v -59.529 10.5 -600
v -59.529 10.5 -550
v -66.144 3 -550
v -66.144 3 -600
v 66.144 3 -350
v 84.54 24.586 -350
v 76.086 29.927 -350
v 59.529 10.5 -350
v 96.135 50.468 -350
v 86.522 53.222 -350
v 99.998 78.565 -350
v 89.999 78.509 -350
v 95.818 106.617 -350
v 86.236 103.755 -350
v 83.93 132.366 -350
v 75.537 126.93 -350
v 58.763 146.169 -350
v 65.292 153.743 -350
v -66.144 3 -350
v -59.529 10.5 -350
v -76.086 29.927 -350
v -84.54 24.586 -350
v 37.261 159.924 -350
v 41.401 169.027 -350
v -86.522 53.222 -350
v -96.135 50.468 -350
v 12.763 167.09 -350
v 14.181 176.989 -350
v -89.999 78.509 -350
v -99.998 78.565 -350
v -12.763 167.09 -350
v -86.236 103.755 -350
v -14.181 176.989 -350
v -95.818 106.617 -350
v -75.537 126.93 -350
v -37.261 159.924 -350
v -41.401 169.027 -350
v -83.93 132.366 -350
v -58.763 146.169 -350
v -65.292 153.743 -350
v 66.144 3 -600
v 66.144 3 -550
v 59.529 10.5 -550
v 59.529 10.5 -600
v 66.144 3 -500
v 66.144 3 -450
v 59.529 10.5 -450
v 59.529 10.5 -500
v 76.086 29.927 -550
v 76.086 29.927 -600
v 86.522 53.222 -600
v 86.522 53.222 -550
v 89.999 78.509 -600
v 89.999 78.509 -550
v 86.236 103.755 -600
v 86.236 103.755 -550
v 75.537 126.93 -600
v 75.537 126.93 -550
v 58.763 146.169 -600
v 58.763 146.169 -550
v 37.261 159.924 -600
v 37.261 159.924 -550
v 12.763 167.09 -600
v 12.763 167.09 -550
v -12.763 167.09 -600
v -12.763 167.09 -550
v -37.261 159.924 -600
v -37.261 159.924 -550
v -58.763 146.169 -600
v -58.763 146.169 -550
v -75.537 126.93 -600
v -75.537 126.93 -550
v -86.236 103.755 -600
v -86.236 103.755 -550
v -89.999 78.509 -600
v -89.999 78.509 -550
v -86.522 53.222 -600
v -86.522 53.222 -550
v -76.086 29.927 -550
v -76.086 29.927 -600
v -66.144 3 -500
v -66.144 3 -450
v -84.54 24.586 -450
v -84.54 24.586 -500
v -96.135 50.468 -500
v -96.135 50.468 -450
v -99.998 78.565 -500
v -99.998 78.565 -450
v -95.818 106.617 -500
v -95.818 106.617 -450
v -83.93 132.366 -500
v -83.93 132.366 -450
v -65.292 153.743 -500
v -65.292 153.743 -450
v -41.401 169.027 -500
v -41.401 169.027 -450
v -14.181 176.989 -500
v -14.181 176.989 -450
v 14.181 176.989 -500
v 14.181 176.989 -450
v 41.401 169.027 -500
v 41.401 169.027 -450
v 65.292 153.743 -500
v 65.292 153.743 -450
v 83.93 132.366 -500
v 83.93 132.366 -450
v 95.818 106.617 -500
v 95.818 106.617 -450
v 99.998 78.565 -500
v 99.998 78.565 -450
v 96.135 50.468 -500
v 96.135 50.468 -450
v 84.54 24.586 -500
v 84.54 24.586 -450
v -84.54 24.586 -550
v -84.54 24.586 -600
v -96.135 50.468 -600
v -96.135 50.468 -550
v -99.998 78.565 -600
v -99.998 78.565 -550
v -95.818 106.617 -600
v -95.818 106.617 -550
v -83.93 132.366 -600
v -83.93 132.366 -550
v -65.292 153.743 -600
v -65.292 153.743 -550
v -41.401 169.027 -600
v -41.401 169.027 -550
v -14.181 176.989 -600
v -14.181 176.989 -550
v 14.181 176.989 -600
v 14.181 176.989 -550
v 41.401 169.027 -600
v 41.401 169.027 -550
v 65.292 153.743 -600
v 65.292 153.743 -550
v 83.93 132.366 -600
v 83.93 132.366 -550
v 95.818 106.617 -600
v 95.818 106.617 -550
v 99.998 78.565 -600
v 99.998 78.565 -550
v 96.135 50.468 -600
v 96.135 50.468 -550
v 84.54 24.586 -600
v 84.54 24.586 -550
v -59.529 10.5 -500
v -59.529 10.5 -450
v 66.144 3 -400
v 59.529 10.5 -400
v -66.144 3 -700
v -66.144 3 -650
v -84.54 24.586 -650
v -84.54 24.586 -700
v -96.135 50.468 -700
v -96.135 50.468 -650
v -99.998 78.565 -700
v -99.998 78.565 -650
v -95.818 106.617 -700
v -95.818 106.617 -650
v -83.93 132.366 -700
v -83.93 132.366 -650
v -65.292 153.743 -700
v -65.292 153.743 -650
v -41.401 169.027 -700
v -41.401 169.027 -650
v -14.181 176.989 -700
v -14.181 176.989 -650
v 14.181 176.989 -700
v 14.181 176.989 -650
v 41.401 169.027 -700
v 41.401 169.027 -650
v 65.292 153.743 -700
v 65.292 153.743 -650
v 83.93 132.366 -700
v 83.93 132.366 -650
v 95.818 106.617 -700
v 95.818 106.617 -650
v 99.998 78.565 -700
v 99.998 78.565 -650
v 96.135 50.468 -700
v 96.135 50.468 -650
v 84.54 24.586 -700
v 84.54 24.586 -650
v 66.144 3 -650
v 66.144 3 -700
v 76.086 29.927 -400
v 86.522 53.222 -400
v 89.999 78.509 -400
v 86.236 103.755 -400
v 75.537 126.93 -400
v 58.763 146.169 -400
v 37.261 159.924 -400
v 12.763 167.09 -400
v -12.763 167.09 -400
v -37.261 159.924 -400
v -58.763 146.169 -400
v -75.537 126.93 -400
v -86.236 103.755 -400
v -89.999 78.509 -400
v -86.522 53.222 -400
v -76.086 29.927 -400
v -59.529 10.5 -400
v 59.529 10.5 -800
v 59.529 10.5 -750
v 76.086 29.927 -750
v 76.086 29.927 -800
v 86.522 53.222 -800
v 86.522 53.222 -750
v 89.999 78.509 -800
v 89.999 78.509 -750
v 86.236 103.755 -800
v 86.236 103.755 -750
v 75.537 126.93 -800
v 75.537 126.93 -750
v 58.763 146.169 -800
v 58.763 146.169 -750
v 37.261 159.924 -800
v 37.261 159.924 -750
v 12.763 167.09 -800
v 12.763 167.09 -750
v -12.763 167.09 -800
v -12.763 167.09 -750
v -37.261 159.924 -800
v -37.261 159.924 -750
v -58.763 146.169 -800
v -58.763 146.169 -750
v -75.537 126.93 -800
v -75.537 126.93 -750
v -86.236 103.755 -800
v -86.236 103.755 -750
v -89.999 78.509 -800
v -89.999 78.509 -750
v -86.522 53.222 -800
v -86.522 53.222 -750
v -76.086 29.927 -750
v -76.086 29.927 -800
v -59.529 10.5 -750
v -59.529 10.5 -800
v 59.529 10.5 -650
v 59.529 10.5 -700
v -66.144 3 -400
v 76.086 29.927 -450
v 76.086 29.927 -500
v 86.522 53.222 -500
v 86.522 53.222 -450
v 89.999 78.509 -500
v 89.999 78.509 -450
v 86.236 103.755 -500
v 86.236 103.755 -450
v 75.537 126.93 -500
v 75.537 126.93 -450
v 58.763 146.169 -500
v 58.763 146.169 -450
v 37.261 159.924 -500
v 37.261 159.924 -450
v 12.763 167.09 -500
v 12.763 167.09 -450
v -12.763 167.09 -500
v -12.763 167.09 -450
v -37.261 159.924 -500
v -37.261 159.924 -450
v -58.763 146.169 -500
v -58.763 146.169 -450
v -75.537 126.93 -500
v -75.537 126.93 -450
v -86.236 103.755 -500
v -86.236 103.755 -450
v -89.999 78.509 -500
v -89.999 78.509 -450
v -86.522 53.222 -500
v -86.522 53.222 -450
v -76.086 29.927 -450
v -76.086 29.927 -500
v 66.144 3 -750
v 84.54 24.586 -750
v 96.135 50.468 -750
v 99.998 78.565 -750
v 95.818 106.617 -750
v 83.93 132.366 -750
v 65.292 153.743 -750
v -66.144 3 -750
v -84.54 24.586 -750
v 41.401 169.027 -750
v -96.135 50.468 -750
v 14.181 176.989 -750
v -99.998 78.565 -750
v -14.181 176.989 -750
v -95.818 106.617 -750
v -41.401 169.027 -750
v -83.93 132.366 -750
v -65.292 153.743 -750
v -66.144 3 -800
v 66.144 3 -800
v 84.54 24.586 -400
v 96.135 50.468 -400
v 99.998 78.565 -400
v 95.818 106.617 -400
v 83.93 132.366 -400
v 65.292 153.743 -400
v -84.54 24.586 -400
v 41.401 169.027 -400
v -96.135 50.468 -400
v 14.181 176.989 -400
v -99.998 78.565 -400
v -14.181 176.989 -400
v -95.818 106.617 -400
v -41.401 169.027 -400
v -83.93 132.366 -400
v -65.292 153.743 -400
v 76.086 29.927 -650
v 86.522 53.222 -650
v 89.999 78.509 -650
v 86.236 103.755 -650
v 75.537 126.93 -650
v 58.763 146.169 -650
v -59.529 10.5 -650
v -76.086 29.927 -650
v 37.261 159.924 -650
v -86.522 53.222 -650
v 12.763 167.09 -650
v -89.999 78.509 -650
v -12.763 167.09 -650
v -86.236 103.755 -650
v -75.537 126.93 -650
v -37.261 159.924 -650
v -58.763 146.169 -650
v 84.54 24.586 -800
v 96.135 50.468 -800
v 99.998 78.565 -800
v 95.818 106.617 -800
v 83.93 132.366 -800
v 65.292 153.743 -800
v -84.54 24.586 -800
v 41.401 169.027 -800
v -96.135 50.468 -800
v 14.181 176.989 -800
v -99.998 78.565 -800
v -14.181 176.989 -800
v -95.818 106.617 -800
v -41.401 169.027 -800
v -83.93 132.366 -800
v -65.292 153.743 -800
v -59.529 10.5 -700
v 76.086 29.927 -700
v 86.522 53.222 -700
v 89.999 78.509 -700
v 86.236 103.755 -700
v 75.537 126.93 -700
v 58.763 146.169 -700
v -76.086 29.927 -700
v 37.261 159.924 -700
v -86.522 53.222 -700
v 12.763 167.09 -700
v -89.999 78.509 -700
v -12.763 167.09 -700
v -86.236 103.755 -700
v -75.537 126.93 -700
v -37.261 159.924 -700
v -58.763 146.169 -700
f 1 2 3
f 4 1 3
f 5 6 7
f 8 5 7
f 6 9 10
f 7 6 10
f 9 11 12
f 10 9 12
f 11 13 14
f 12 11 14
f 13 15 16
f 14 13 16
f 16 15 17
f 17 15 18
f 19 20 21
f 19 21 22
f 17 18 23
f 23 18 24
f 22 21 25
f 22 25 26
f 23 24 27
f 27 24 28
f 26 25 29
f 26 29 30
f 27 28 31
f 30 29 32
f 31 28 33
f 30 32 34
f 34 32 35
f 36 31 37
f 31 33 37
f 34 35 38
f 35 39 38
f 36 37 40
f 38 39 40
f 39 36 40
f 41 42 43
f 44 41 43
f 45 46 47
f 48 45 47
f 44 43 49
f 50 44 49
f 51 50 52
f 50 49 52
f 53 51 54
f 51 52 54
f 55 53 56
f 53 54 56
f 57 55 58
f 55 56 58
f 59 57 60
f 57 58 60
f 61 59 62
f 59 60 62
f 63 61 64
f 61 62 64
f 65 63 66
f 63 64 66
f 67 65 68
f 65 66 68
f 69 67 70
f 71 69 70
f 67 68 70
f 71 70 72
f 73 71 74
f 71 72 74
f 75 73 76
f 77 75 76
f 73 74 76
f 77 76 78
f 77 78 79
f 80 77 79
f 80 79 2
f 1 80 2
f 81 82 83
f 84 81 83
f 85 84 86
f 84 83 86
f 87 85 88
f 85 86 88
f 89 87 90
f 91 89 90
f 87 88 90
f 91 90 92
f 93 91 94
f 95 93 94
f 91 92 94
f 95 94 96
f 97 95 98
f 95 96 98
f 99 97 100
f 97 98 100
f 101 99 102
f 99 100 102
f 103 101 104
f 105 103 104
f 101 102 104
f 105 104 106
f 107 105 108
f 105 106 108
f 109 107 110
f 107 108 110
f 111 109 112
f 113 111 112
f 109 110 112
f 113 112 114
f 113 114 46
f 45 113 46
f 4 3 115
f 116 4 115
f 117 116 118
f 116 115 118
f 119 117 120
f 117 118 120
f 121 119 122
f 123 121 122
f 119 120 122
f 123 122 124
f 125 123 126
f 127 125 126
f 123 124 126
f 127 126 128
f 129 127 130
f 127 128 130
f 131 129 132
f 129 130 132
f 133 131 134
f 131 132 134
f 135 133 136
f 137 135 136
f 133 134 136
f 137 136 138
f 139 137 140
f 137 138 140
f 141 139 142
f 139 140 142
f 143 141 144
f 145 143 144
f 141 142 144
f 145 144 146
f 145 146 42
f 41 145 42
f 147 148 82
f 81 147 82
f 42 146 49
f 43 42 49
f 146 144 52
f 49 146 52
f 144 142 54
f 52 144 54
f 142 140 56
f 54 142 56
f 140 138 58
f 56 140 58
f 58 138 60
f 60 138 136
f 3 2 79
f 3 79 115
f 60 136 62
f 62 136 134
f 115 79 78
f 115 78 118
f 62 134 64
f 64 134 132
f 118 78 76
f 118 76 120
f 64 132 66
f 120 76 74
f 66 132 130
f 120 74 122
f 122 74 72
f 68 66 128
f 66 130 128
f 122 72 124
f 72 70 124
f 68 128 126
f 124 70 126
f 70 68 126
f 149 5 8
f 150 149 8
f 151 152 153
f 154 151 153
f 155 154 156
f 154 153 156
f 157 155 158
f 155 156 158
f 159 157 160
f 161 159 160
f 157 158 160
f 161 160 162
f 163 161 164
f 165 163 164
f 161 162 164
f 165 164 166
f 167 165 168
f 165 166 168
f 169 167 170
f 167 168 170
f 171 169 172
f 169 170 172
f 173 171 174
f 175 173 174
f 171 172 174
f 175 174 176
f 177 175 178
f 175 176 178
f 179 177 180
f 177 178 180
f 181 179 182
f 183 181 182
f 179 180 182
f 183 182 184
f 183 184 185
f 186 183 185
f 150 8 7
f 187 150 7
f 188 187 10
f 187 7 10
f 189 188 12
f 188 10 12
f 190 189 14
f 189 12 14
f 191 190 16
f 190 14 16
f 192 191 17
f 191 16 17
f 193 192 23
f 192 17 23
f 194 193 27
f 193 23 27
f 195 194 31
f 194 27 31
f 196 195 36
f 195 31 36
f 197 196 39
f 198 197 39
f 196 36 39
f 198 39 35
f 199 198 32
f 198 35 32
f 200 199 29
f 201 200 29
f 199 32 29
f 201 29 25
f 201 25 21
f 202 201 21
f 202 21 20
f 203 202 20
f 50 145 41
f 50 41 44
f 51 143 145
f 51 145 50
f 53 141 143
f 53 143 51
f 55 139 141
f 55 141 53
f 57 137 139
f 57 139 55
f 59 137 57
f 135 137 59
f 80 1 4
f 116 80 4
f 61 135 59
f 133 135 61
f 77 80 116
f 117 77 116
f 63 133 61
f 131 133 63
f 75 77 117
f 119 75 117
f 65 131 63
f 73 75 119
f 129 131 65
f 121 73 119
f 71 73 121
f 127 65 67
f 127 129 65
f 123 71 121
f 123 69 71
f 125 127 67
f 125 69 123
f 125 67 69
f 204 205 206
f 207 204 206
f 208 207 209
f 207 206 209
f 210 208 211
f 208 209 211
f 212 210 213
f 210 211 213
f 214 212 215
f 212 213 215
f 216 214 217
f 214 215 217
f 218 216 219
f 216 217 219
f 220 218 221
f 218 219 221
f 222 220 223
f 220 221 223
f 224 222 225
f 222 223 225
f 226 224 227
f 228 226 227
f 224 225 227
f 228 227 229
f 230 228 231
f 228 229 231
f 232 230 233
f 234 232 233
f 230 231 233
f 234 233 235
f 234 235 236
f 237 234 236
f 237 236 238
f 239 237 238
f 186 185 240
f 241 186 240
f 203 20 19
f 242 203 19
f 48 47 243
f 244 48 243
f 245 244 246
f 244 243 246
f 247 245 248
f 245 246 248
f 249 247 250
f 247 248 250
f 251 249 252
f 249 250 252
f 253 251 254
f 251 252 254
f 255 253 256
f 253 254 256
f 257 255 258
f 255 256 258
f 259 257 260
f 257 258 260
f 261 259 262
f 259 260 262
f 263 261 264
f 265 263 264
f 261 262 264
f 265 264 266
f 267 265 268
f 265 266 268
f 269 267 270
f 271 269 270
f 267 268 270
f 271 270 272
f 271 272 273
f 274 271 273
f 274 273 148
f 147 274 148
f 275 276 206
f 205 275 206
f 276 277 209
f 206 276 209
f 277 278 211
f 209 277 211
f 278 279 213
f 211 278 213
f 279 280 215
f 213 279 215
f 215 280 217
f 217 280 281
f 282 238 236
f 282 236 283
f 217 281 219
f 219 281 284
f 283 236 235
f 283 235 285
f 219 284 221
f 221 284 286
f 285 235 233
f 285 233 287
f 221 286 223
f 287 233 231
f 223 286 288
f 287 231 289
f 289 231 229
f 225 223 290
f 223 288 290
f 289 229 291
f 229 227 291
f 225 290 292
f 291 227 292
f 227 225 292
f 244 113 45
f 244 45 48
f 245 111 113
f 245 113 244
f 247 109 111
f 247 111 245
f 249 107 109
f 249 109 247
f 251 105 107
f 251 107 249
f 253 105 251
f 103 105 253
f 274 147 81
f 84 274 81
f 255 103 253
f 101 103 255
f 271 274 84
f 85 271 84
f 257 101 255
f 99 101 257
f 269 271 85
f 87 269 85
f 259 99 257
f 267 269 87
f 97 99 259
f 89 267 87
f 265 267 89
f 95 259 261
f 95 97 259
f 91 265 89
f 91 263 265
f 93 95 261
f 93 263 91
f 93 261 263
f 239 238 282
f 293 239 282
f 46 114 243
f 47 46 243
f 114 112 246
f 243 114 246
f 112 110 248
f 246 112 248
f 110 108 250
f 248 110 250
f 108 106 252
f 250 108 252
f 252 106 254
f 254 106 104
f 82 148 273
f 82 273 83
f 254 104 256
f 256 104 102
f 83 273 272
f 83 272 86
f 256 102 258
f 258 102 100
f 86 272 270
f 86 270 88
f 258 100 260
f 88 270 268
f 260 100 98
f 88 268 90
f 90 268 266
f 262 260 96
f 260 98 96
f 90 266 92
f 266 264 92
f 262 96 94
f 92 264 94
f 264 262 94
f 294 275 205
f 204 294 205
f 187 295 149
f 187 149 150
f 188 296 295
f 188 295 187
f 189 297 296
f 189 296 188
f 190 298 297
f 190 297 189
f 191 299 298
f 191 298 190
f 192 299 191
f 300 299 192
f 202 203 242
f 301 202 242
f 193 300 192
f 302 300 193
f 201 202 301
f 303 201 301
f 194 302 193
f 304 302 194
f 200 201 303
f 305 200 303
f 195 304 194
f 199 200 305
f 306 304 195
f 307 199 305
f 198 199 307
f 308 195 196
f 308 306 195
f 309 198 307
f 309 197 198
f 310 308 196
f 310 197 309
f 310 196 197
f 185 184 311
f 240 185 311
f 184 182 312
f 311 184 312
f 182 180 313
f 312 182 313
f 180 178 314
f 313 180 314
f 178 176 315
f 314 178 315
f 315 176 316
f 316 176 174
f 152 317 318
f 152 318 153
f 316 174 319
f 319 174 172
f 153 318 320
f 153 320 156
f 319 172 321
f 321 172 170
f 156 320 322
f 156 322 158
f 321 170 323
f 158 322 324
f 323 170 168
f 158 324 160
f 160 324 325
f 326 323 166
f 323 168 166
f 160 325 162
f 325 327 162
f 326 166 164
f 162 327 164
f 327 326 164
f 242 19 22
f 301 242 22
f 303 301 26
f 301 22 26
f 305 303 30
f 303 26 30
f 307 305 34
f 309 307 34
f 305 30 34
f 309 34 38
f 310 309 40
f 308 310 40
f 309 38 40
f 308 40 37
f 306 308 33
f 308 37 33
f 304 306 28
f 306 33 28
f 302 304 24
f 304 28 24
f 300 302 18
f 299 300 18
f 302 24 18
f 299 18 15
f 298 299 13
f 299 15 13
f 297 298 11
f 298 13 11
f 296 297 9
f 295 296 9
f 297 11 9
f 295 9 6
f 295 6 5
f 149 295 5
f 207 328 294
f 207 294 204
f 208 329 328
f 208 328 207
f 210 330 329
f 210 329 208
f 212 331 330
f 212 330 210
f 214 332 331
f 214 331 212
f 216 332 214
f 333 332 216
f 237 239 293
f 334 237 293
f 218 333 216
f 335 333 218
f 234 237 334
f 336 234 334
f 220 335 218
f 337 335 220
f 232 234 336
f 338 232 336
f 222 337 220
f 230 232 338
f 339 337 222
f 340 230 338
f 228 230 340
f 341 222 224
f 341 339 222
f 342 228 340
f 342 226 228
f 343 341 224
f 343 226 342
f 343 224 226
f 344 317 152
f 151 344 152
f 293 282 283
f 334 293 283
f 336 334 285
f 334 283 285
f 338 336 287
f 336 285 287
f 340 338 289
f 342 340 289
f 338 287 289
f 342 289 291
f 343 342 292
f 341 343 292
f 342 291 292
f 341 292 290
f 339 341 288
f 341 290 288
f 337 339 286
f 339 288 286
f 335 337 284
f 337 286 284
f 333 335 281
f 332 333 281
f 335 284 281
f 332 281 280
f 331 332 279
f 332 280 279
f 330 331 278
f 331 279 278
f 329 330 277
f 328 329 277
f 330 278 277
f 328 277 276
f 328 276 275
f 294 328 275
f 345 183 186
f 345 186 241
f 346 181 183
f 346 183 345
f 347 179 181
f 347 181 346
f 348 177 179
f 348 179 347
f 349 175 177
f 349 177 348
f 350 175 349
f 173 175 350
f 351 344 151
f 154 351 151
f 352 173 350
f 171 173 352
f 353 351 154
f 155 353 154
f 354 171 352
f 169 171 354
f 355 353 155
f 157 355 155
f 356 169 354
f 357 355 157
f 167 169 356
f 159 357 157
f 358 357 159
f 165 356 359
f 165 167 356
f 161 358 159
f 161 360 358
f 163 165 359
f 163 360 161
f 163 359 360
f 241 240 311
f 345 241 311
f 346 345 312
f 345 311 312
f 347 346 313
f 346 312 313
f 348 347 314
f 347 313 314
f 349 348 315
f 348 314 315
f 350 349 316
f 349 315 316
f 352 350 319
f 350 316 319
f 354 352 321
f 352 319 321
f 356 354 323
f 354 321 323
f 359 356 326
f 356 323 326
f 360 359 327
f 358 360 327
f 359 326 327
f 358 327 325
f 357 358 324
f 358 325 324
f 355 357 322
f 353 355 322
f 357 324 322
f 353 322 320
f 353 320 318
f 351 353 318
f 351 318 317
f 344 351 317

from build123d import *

# Parameters (mm, degrees)
EXTRUDE_THIN1_START = -350
EXTRUDE_THIN1_DEPTH = 50
LPATTERN1_COUNT     = 5
LPATTERN1_PITCH     = 100


with BuildPart() as part:
    # Sketch2 → Extrude-Thin1 (new body)
    with BuildSketch(Plane.XY.offset(EXTRUDE_THIN1_START)):
        with BuildLine():
            ThreePointArc((-66.143782777, 3), (0, 178), (66.143782777, 3))
            Line((66.143782777, 3), (59.529404499, 10.5))
            ThreePointArc((59.529404499, 10.5), (0, 168), (-59.529404499, 10.5))
            Line((-59.529404499, 10.5), (-66.143782777, 3))
        make_face()
    extrude(amount=-EXTRUDE_THIN1_DEPTH)


with BuildPart() as lpattern1_1:
    # LPattern1: pattern copy
    add(part.part.moved(Location(Vector(0, 0, -1) * (1 * LPATTERN1_PITCH))))


with BuildPart() as lpattern1_2:
    # LPattern1: pattern copy
    add(part.part.moved(Location(Vector(0, 0, -1) * (2 * LPATTERN1_PITCH))))


with BuildPart() as lpattern1_3:
    # LPattern1: pattern copy
    add(part.part.moved(Location(Vector(0, 0, -1) * (3 * LPATTERN1_PITCH))))


with BuildPart() as lpattern1_4:
    # LPattern1: pattern copy
    add(part.part.moved(Location(Vector(0, 0, -1) * (4 * LPATTERN1_PITCH))))


solid = Compound([part.part, lpattern1_1.part, lpattern1_2.part, lpattern1_3.part, lpattern1_4.part])
